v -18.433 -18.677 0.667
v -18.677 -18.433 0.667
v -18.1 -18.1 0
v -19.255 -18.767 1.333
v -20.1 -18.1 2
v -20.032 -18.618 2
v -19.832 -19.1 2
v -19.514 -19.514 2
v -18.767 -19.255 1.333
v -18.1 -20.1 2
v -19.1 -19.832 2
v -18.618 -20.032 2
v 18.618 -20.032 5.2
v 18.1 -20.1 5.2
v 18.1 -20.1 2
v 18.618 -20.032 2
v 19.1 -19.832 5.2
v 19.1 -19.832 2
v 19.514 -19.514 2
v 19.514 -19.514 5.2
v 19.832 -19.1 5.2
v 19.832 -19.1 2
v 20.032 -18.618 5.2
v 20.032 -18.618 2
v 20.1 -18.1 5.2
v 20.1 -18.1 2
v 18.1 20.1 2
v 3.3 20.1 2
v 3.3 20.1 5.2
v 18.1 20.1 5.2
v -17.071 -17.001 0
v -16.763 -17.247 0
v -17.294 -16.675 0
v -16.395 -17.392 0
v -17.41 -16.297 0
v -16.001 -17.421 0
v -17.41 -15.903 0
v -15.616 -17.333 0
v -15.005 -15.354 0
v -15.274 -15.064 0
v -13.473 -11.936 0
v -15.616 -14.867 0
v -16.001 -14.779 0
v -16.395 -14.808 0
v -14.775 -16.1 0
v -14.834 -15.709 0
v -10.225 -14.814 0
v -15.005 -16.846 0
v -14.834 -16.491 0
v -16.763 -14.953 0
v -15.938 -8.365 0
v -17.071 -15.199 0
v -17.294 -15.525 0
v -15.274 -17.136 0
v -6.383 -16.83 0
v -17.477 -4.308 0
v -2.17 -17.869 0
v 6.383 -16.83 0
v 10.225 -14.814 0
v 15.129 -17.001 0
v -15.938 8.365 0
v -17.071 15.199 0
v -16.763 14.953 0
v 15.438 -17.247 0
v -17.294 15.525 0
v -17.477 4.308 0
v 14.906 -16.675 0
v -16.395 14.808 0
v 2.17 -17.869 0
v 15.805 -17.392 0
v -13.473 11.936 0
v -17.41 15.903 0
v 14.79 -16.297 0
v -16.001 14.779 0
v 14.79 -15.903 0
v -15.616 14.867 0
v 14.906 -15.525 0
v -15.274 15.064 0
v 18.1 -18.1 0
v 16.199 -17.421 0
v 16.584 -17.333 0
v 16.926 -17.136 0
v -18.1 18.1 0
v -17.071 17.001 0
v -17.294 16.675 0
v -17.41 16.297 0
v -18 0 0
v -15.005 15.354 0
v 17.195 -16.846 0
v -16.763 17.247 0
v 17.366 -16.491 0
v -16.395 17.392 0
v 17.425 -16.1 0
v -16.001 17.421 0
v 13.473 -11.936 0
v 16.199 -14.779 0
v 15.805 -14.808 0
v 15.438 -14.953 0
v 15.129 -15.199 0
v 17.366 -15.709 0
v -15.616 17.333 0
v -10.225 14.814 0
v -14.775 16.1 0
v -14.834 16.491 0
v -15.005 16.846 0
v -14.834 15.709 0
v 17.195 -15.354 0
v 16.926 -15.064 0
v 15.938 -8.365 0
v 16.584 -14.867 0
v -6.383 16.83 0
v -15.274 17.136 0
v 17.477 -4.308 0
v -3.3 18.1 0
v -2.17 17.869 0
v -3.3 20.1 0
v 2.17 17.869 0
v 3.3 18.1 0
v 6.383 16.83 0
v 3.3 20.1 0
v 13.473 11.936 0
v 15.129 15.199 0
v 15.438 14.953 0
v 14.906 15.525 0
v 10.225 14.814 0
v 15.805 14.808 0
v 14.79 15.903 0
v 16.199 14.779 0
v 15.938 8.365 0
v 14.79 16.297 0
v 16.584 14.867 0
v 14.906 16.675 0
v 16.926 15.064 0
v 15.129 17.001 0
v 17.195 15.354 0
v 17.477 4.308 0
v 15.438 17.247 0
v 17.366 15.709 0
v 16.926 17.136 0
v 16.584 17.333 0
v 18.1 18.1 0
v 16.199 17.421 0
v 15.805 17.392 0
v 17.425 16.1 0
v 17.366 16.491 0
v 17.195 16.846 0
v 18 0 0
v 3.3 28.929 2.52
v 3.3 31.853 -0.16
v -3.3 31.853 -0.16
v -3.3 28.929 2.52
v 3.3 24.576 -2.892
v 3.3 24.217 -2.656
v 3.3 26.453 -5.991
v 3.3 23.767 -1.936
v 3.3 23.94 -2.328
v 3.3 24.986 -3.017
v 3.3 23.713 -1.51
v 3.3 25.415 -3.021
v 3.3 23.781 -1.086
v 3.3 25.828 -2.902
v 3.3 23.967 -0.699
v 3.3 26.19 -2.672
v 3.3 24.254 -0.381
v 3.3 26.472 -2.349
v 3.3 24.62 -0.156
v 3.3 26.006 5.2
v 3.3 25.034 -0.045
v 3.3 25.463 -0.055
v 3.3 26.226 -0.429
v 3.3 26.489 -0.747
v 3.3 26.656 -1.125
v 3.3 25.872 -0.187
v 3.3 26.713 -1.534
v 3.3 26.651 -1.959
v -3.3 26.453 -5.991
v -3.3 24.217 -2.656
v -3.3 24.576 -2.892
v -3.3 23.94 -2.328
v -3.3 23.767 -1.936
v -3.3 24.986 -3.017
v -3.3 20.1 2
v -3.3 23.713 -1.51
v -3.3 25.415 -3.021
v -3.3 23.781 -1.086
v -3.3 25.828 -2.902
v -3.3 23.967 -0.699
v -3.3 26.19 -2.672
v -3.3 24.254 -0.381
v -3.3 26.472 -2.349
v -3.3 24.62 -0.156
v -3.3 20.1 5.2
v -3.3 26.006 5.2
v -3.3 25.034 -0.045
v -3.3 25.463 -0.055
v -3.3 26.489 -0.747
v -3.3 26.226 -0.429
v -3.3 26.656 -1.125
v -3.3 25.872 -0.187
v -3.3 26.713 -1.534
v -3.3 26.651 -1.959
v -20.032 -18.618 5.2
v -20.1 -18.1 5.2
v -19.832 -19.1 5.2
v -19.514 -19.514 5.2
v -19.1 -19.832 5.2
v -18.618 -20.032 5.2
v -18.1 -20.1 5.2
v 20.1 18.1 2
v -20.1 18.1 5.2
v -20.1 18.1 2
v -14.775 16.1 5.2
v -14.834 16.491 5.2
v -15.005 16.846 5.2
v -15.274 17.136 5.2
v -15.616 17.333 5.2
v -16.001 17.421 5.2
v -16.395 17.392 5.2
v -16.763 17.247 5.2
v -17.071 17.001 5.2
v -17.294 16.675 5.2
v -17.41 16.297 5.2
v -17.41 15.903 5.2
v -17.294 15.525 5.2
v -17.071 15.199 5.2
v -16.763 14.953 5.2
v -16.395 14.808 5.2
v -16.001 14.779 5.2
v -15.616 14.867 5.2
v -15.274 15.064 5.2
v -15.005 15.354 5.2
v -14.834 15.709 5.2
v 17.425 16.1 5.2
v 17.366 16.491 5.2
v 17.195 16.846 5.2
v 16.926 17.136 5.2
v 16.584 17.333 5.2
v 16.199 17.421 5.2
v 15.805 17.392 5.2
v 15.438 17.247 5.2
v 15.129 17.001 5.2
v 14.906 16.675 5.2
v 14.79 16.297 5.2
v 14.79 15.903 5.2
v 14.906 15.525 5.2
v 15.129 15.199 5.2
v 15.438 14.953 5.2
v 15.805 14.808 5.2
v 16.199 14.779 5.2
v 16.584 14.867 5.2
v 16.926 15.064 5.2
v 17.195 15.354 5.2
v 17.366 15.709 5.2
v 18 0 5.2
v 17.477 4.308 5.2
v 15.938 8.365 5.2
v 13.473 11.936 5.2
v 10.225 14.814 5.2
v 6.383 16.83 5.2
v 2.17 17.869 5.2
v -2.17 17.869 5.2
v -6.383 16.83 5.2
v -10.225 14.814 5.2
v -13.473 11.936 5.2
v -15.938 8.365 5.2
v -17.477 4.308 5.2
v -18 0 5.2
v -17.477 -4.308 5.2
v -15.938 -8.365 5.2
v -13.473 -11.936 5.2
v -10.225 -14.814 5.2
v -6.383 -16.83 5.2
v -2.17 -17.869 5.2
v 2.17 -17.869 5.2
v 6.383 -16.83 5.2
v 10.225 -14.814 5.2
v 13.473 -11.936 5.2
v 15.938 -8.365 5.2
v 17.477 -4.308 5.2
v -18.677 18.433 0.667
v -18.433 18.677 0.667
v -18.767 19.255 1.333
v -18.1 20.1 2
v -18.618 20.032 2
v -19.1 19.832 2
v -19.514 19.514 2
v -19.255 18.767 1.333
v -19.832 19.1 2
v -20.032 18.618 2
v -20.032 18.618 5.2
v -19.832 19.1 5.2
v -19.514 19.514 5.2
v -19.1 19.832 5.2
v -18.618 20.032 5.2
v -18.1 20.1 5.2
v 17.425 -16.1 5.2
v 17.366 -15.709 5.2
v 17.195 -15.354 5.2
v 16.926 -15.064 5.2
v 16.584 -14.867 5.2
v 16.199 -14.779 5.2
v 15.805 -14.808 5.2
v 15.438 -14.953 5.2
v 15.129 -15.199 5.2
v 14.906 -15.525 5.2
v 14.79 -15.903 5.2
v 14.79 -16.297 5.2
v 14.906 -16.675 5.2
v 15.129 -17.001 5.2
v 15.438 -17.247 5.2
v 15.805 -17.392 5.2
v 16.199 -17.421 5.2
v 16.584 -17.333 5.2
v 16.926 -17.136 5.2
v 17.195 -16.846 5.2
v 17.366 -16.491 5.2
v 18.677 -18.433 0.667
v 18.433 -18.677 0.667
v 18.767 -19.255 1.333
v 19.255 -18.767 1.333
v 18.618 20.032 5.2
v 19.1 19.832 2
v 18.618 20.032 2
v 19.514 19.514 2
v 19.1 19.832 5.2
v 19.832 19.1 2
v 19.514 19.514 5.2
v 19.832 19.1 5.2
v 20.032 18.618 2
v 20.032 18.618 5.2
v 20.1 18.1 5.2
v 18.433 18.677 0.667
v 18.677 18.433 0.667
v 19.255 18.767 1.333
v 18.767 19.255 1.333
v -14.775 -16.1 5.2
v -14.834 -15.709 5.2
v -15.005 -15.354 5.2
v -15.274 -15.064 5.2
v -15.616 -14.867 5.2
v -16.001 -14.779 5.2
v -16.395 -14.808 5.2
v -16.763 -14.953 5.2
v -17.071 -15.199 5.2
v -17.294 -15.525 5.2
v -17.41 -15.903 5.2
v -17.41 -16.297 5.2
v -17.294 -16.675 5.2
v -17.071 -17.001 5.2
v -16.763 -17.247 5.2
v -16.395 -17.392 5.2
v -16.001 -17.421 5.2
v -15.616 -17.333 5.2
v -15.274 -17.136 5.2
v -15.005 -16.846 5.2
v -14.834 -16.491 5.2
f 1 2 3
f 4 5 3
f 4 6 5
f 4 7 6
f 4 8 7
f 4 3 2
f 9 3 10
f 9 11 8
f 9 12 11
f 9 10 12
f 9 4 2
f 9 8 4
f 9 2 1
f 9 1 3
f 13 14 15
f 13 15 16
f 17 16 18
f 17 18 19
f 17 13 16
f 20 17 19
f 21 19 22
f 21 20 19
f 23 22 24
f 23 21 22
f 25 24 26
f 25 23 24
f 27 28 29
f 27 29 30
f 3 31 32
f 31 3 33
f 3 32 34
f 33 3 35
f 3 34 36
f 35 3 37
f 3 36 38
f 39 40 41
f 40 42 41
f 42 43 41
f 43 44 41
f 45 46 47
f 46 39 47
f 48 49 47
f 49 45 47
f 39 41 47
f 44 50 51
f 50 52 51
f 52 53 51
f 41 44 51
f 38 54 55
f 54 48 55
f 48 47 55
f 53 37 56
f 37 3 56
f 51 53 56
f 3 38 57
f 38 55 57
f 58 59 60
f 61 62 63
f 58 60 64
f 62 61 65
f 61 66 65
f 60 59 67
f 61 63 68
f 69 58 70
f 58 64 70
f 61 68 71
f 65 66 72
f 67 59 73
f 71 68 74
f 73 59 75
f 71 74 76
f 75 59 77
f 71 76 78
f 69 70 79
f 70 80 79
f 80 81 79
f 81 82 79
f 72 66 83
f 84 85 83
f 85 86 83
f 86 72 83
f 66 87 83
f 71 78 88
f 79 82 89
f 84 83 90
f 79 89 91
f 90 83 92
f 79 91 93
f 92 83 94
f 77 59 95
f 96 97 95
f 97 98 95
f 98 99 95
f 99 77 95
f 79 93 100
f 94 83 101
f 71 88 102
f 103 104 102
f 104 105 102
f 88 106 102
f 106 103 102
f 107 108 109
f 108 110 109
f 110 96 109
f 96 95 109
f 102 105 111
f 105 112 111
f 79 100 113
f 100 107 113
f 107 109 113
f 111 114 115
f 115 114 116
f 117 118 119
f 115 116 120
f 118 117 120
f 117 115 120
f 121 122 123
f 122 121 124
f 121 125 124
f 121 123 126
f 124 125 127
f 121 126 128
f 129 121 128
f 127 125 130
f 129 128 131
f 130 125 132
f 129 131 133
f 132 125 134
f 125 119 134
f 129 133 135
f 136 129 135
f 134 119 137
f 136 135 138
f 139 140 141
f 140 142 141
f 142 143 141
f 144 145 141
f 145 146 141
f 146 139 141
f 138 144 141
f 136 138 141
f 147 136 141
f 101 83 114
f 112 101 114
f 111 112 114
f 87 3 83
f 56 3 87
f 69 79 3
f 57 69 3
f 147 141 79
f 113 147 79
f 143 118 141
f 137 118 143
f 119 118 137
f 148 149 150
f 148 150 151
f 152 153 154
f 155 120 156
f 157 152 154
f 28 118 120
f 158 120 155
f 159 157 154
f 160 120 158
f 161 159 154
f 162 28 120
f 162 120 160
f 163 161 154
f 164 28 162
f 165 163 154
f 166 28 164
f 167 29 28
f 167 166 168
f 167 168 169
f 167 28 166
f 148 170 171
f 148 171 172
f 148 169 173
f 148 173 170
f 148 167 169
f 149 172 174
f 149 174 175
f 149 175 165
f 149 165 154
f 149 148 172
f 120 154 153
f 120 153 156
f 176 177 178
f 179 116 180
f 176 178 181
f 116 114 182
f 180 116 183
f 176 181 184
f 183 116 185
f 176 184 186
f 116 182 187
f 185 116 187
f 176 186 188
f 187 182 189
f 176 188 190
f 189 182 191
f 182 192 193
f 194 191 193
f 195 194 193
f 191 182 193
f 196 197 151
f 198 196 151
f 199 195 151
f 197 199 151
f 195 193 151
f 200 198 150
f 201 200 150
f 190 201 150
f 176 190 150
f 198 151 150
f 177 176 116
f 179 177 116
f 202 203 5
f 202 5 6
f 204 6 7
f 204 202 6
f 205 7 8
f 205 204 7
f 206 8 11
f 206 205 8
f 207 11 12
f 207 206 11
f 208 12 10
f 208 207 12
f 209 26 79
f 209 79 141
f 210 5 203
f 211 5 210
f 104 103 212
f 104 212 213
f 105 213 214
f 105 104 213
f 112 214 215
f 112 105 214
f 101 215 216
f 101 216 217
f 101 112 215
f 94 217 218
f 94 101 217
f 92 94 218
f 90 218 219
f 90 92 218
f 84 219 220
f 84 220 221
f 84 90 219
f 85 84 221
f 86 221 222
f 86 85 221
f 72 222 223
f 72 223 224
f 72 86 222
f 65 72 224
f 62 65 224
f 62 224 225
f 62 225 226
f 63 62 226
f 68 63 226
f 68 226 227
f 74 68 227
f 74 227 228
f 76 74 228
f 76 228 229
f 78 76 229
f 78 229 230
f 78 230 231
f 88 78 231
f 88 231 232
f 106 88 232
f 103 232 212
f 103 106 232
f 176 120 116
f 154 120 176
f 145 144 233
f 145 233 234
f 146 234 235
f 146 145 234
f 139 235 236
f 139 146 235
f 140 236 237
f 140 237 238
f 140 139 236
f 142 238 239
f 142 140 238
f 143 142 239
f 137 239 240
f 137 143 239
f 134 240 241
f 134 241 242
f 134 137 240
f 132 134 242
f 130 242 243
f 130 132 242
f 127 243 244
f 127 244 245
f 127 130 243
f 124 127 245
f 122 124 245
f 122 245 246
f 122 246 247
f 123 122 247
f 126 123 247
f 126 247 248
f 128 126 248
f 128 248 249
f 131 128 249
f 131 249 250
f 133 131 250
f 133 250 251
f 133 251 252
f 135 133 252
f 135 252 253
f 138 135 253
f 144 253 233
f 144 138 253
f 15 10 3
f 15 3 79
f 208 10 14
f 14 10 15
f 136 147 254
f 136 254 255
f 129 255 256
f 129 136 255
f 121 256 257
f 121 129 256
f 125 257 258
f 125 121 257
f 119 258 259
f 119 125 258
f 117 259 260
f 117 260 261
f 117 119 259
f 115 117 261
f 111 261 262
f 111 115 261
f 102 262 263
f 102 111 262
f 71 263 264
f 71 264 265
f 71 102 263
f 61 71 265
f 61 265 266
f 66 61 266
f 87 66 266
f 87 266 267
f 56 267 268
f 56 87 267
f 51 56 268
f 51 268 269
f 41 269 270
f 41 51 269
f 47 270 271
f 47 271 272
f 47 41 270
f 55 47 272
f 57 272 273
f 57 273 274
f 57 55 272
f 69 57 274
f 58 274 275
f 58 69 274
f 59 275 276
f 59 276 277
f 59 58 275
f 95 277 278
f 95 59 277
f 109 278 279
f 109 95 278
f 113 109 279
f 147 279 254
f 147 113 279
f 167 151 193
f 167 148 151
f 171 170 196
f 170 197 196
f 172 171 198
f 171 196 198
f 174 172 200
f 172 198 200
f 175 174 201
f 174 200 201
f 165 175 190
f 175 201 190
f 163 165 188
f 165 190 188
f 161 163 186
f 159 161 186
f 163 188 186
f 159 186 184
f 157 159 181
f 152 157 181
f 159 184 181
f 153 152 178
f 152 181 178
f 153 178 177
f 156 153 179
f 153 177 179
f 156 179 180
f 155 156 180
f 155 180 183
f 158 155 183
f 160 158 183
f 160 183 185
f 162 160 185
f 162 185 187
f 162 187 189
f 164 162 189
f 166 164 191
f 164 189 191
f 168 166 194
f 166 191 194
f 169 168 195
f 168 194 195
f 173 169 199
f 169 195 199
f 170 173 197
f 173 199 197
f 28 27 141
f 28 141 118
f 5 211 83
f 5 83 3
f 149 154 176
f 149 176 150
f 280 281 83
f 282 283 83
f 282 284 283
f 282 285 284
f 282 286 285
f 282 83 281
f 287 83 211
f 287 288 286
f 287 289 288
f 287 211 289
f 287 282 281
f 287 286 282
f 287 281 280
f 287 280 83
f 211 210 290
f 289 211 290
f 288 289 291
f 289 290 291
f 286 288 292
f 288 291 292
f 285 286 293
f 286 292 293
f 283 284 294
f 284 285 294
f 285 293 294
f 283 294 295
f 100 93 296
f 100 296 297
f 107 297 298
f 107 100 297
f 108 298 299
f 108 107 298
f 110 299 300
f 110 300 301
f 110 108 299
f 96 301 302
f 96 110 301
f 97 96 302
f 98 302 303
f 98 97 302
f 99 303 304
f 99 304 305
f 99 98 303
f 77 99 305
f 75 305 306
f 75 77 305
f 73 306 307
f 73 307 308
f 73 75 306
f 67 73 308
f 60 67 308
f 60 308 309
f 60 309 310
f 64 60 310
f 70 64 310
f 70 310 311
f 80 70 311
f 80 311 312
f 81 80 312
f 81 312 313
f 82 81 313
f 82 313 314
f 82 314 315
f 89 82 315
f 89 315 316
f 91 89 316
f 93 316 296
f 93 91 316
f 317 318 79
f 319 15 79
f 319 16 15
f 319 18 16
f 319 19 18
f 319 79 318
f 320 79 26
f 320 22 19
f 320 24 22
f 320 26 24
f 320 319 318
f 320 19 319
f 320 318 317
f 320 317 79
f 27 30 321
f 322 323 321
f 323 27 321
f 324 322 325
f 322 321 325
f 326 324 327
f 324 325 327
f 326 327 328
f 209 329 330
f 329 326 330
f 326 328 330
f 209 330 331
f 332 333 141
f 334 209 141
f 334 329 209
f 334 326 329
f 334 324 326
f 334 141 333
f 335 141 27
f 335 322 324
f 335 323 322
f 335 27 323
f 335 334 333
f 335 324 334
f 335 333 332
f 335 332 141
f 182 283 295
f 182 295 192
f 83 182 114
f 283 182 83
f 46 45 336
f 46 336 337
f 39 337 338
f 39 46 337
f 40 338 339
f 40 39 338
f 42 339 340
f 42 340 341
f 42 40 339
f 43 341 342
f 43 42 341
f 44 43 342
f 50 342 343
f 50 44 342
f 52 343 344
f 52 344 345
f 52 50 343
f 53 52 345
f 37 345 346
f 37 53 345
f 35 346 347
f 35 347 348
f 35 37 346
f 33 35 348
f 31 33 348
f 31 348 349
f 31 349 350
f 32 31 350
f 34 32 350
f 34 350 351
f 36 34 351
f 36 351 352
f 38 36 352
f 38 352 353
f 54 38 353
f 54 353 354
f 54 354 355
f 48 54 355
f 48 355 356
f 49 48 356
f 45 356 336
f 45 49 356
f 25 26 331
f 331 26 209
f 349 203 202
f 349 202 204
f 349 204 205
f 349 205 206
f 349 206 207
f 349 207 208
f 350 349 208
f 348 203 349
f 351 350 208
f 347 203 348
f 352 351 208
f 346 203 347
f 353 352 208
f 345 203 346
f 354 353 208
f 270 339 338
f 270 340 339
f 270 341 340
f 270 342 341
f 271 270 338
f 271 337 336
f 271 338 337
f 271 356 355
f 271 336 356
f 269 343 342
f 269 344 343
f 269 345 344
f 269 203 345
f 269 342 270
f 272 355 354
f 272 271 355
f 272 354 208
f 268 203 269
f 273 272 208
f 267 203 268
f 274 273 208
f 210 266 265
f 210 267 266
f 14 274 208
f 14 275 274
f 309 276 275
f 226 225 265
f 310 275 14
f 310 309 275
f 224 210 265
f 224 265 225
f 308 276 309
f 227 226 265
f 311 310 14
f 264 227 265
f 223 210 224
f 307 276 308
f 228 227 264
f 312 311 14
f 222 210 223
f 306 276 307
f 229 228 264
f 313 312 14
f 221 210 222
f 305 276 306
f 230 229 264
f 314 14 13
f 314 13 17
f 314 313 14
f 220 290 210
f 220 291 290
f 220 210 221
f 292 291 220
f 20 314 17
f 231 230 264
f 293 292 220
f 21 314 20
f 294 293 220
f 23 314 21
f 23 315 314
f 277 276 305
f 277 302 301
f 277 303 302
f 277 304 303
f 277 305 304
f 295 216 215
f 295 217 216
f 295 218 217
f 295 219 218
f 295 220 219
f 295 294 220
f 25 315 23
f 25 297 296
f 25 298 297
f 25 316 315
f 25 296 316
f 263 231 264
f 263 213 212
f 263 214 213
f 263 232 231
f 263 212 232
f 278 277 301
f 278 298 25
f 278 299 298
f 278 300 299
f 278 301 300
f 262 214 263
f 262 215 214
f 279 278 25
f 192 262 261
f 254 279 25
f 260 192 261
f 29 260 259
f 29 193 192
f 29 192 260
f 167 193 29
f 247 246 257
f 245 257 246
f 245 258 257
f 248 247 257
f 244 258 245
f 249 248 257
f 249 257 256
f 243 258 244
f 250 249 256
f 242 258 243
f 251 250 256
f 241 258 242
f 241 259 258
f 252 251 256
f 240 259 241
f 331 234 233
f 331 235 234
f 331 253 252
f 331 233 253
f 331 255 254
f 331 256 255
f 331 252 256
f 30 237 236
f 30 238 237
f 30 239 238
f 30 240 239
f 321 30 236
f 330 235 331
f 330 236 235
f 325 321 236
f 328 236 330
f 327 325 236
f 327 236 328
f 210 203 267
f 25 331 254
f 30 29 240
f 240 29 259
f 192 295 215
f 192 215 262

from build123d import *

# Parameters (mm, degrees)
F0_W     = 40.2
F0_H     = 40.2
F0_R     = 1.325
F0_R_2   = 18
F1_DEPTH = 5.2
F2_R     = 2
F6_DEPTH = 3.3
F7_SIZE  = 1.99999


# Not quite as in the source:
# - a fillet or chamfer is up to 0.001 mm smaller than in the source, because OpenCascade refuses the exact size


with BuildPart() as f1:
    # F0 (on Top) → F1 (new body)
    with BuildSketch(Plane.XY):
        Rectangle(F0_W, F0_H)
        with Locations((-16.1, -16.1)):
            Circle(F0_R, mode=Mode.SUBTRACT)
        with Locations((16.1, -16.1)):
            Circle(F0_R, mode=Mode.SUBTRACT)
        with Locations((-16.1, 16.1)):
            Circle(F0_R, mode=Mode.SUBTRACT)
        Circle(F0_R_2, mode=Mode.SUBTRACT)
        with Locations((16.1, 16.1)):
            Circle(F0_R, mode=Mode.SUBTRACT)
    extrude(amount=F1_DEPTH)

    # F2
    f2_edges = [f1.edges().sort_by_distance(p)[0] for p in [
        (-20.1, 20.1, 2.6),
        (20.1, 20.1, 2.6),
        (20.1, -20.1, 2.6),
        (-20.1, -20.1, 2.6),
    ]]
    fillet(f2_edges, radius=F2_R)

    # F5 (on line) → F6 (join, symmetric)
    with BuildSketch(Plane.YZ):
        Polygon((20.1, 5.2), (20.1, 0), (26.4531082501, -5.9914017233), (31.8527851563, -0.1601095172), (28.929274422, 2.5199452414), (26.0057636878, 5.2), align=None)
        with BuildLine():
            ThreePointArc((26.7126609223, -1.5342851533), (23.8396290954, -2.1382583334), (26.2262827859, -0.4285859547))
            ThreePointArc((26.2262827859, -0.4285859547), (26.5856927492, -0.9303119732), (26.7126609223, -1.5342851533))
        make_face(mode=Mode.SUBTRACT)
    extrude(amount=F6_DEPTH, both=True)

    # F7 (size 2 in the source; OpenCascade refuses exactly that, so slightly less here)
    f7_edges = [f1.edges().sort_by_distance(p)[0] for p in [
        (0, -20.1, 0),
    ]]
    chamfer(f7_edges, length=F7_SIZE)


solid = f1.part
